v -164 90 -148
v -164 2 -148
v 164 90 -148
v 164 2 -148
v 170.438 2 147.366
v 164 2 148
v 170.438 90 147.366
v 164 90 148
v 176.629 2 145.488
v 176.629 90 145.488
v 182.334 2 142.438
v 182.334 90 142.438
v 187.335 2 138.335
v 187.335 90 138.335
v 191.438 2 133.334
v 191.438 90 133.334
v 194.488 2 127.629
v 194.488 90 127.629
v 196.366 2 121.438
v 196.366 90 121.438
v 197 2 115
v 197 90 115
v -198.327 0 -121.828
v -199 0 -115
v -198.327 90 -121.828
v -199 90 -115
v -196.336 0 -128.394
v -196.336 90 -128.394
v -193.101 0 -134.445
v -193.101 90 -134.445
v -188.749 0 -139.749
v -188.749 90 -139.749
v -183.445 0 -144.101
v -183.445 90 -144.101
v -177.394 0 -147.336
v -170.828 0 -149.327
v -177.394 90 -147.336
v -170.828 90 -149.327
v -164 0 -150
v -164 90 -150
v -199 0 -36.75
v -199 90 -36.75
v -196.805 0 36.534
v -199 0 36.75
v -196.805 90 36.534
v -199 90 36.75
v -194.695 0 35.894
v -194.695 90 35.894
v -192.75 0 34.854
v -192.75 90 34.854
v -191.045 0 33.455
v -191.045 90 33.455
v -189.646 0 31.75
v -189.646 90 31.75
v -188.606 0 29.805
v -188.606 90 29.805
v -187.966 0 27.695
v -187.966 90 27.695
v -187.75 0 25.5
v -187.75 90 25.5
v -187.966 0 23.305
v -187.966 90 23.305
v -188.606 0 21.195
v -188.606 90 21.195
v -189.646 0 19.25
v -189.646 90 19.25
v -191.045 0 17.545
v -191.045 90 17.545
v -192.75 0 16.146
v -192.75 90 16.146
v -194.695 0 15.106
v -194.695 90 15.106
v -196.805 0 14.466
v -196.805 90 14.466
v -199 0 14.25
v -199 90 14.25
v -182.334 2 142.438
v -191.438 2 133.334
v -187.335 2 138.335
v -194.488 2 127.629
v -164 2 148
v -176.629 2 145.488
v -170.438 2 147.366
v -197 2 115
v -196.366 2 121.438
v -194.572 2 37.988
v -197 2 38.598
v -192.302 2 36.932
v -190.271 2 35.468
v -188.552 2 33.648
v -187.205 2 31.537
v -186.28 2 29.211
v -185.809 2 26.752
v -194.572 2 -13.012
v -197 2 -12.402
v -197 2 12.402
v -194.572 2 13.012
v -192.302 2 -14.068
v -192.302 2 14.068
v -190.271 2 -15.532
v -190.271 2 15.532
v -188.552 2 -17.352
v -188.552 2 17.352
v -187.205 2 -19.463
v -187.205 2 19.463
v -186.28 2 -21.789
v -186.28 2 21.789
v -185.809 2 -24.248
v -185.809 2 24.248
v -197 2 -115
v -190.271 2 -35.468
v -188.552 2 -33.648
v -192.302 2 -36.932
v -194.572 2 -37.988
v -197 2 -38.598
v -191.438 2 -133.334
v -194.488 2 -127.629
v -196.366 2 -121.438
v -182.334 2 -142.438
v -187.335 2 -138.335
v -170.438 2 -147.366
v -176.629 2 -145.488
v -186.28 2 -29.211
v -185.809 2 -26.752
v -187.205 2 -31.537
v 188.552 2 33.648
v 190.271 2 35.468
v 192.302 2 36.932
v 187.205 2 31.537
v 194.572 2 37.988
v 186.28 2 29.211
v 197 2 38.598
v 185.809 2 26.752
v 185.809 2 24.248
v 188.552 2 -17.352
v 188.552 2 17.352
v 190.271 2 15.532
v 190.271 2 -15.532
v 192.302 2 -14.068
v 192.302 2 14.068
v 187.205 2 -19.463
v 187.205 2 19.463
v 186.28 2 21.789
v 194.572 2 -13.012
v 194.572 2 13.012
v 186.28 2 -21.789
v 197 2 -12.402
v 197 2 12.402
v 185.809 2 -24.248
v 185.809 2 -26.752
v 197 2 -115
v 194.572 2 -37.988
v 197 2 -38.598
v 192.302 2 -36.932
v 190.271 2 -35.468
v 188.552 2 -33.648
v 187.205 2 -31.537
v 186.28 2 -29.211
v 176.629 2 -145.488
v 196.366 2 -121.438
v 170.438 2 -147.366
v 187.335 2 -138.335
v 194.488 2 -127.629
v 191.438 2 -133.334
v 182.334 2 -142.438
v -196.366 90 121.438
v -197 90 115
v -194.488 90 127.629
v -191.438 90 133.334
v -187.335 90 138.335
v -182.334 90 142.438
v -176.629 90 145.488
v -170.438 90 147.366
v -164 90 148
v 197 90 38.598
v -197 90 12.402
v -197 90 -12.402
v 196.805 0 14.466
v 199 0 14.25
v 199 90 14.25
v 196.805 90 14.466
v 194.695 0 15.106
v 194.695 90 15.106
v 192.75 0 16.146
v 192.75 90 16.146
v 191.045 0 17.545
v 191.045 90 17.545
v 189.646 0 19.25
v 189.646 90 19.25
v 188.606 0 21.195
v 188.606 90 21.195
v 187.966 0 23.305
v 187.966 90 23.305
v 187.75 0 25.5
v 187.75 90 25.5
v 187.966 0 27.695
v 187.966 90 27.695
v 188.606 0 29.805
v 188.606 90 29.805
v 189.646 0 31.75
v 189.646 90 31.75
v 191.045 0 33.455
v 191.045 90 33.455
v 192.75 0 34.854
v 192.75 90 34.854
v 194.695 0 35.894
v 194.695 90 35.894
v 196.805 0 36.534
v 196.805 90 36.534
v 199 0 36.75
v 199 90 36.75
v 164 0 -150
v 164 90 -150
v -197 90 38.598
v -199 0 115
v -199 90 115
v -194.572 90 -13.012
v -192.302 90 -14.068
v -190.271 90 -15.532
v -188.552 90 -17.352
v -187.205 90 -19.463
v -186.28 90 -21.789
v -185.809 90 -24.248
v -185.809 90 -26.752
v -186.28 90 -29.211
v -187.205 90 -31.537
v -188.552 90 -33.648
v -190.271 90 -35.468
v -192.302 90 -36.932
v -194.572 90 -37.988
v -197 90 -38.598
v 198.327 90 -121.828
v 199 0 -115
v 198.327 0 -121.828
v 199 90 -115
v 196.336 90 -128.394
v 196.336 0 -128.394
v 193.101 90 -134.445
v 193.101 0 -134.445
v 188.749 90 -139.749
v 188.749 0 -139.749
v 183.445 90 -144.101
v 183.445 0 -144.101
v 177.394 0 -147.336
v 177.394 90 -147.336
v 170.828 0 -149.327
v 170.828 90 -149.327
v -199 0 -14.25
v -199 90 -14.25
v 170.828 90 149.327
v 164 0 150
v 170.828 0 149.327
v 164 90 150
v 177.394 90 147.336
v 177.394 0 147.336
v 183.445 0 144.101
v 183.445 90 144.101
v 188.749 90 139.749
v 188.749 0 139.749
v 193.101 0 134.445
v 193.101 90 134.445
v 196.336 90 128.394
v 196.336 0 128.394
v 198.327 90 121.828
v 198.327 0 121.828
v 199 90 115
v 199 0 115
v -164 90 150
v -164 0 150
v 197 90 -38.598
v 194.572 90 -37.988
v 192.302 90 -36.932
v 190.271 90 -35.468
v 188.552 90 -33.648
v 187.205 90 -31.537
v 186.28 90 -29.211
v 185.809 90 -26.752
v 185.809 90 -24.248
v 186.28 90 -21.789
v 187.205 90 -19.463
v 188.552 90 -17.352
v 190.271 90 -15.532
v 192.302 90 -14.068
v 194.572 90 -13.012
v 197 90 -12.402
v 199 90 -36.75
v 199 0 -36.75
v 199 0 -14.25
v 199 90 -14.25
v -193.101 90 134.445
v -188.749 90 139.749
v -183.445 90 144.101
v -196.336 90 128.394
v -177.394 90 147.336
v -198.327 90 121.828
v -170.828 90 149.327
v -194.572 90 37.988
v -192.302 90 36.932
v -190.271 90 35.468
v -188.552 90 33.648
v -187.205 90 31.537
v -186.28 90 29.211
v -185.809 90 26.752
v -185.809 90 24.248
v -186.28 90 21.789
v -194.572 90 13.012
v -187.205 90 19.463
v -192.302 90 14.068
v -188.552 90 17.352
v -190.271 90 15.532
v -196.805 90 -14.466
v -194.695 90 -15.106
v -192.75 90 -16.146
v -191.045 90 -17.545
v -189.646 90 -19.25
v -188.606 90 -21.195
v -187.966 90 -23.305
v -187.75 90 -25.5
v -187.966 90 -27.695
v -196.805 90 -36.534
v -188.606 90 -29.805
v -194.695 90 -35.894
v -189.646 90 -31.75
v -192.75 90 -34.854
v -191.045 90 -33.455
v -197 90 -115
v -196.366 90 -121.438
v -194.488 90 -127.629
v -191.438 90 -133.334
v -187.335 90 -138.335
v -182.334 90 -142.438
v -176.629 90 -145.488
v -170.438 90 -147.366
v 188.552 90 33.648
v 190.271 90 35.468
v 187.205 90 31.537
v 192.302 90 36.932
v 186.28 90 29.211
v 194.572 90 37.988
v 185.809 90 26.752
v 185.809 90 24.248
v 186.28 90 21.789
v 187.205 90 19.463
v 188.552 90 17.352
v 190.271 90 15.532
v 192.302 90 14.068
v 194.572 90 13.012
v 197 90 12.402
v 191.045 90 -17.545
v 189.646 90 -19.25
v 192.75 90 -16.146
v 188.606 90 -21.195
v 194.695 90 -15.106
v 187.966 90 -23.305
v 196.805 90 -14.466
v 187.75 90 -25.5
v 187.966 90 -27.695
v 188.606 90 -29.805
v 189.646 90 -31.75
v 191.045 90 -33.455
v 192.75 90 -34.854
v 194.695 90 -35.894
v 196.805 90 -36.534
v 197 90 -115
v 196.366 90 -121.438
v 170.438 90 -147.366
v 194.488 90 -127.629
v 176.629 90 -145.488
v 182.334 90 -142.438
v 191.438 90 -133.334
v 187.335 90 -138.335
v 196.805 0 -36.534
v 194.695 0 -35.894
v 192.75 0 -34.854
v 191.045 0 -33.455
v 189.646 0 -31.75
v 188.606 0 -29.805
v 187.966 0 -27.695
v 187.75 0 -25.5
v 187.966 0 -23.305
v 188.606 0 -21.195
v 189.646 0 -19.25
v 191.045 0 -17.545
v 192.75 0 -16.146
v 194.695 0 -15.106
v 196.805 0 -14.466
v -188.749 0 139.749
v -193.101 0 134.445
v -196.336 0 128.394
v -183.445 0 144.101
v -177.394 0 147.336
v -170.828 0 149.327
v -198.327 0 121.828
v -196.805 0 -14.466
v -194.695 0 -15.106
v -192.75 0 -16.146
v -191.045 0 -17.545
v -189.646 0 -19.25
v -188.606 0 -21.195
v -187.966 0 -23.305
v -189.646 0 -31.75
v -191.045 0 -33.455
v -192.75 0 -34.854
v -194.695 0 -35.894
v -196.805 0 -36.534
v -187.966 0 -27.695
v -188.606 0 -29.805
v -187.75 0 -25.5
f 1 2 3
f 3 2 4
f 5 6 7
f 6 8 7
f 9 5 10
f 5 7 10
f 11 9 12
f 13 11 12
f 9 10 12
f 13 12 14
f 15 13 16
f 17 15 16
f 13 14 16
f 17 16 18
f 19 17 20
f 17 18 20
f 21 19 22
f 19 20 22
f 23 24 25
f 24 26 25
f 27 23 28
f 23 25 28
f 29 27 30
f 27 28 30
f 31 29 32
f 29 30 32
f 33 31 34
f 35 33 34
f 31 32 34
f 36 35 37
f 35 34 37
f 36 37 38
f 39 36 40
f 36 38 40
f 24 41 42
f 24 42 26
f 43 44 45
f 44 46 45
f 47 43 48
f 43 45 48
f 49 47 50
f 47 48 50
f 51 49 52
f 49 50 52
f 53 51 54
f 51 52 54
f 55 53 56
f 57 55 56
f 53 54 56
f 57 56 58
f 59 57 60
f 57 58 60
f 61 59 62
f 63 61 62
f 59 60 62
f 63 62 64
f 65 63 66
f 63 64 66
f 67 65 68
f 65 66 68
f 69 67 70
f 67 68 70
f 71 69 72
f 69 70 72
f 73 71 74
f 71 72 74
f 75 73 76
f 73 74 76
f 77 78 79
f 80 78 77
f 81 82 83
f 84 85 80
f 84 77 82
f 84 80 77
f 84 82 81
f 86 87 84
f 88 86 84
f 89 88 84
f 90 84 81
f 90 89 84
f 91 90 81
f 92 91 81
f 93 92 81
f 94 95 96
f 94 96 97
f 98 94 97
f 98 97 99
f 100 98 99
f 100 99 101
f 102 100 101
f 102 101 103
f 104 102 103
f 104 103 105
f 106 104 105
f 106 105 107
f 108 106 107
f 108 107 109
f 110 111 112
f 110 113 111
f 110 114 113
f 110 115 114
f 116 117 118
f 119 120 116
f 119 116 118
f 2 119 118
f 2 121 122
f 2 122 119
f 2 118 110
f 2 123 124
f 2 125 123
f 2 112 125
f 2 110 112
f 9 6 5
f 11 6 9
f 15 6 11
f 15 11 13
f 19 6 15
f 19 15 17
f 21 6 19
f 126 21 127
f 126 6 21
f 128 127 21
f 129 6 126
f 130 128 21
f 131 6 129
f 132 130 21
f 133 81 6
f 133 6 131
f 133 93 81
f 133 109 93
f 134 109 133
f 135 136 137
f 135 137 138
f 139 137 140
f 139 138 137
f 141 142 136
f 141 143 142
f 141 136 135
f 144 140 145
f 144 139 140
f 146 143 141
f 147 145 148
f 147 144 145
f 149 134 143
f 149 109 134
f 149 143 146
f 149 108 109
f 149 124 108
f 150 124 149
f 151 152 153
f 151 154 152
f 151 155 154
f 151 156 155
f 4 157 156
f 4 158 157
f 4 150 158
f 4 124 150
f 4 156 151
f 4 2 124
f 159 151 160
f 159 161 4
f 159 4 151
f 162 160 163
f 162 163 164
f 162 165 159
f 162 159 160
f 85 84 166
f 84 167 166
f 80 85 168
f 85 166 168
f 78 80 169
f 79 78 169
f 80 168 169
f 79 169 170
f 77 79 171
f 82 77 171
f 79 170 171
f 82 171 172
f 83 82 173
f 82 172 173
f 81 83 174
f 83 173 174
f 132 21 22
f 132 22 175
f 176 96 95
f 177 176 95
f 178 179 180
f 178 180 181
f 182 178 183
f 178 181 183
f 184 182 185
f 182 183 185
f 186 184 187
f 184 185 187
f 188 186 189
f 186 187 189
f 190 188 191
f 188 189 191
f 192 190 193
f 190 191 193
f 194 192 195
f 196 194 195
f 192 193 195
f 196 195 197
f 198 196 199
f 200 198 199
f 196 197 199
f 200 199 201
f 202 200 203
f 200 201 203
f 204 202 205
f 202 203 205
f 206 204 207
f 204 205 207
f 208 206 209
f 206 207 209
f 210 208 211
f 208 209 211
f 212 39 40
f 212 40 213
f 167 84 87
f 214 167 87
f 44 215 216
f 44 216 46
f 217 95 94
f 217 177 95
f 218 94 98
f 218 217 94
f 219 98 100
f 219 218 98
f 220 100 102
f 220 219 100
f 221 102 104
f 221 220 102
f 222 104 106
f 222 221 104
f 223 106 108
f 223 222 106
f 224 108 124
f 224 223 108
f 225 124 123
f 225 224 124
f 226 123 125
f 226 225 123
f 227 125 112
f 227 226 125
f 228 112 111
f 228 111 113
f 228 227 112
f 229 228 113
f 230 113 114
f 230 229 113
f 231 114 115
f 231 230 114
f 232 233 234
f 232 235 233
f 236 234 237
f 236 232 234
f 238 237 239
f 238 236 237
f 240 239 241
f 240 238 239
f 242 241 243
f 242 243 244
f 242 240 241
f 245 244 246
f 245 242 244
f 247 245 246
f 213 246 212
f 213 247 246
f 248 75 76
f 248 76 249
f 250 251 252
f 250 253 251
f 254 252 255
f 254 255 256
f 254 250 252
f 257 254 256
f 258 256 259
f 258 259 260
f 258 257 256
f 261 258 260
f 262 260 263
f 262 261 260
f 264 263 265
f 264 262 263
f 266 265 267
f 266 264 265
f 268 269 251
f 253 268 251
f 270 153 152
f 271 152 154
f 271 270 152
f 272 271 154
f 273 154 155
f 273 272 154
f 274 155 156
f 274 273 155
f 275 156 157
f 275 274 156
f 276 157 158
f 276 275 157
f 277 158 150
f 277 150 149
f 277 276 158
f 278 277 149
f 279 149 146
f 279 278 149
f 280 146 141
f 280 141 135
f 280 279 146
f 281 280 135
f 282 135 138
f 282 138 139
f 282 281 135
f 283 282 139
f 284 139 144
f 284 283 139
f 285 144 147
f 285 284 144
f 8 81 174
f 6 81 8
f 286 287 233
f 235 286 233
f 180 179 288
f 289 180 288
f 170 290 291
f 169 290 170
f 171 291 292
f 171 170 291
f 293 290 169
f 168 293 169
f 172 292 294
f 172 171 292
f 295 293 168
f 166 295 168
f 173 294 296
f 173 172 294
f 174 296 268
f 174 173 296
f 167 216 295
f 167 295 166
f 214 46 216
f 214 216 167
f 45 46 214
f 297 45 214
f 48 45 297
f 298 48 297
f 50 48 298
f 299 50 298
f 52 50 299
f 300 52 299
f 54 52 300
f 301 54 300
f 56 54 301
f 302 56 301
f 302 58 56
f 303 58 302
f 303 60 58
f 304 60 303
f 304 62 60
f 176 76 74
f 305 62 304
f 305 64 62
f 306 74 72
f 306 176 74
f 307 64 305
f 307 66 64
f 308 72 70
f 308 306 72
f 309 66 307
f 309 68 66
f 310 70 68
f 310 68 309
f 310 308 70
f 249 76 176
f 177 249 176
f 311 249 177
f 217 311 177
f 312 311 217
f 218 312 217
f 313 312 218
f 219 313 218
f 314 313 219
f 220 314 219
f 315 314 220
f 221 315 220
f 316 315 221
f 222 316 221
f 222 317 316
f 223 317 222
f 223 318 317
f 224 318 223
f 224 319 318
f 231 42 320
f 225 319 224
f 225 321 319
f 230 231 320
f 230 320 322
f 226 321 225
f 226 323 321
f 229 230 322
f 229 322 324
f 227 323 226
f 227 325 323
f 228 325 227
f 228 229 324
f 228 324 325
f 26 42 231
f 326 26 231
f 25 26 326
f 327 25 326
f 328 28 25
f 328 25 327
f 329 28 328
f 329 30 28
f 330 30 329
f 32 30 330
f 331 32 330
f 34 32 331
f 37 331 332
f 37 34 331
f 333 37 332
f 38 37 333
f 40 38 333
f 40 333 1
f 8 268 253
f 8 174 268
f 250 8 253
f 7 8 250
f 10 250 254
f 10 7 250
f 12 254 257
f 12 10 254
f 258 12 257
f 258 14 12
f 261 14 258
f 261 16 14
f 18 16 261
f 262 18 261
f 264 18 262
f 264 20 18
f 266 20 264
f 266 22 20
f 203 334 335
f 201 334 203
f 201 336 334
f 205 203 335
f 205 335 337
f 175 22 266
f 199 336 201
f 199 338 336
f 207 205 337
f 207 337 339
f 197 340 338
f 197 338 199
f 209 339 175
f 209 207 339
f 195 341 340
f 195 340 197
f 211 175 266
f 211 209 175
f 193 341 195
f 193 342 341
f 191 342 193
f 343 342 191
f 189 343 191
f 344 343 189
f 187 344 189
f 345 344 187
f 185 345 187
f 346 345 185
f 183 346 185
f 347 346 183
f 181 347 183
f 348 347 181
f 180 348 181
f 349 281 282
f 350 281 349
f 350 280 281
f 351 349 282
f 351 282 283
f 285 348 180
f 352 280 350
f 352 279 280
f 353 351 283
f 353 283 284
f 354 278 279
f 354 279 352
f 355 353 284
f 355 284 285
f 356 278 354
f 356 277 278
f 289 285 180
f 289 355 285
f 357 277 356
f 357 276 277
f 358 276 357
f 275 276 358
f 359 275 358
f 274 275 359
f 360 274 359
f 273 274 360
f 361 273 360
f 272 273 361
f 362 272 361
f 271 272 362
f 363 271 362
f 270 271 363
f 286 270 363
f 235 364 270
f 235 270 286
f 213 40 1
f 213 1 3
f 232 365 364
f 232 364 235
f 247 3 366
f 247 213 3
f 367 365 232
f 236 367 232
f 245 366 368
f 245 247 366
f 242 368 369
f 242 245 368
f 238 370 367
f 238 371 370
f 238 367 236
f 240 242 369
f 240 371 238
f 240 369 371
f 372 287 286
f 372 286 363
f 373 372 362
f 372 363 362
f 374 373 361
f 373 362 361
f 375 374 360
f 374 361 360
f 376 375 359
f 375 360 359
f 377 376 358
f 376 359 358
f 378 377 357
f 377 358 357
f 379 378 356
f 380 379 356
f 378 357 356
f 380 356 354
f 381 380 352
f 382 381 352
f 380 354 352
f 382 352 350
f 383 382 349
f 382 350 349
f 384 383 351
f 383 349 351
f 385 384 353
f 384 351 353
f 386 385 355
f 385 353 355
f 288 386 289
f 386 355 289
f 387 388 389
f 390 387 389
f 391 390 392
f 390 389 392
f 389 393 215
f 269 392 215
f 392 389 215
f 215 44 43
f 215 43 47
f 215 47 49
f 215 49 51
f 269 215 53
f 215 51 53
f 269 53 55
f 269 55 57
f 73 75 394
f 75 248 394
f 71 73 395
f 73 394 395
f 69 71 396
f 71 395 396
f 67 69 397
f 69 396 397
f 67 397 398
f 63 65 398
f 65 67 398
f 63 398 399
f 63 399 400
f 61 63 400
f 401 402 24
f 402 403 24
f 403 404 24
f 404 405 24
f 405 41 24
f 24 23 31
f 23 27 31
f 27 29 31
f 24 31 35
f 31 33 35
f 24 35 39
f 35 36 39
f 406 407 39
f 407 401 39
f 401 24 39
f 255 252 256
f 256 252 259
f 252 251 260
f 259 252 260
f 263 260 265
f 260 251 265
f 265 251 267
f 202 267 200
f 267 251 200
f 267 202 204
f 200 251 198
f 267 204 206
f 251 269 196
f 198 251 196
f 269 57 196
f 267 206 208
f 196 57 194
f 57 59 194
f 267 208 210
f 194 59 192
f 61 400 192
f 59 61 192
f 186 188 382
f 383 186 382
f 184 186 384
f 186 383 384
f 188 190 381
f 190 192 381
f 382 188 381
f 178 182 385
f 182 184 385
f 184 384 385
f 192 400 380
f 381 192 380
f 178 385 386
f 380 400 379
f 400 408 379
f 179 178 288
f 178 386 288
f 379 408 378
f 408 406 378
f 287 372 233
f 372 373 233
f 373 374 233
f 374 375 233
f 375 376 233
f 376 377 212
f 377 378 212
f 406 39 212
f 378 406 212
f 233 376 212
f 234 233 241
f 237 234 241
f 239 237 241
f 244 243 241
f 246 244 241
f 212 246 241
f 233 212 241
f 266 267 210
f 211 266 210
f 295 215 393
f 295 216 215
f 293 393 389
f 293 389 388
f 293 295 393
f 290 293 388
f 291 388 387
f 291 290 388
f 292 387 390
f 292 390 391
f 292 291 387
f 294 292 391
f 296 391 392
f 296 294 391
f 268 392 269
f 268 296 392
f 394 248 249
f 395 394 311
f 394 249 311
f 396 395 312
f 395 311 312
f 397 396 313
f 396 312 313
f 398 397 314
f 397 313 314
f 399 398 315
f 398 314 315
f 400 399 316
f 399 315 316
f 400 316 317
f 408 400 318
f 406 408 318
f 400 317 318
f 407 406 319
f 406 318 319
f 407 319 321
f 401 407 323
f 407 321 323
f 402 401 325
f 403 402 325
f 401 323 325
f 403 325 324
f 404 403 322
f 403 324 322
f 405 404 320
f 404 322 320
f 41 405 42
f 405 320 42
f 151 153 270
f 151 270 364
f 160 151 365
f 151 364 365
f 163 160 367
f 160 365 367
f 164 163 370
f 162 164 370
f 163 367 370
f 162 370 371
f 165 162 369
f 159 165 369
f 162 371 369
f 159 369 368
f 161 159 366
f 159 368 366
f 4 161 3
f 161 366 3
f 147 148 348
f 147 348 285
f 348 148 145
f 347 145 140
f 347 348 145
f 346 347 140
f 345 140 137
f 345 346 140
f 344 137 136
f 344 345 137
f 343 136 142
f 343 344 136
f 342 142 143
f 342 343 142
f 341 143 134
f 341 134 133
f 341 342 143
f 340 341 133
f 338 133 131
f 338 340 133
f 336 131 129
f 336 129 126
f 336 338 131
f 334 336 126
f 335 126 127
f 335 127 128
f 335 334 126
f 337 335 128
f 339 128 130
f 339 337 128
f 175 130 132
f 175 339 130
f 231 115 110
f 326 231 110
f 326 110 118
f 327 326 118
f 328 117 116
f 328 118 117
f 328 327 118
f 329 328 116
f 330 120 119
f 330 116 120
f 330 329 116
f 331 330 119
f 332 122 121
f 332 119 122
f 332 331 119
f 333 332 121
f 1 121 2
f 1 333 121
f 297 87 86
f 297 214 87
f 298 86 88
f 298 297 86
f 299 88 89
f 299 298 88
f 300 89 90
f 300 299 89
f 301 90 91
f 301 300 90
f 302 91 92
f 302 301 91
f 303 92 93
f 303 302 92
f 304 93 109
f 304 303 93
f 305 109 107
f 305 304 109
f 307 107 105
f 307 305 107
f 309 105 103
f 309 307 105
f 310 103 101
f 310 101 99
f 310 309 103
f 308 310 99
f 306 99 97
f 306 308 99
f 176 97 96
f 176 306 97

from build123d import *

# Parameters (mm, degrees)
SKETCH_1_W          = 398
SKETCH_1_H          = 300
EXTRUDE_1_DEPTH     = 90
FILLET_1_R          = 35
SKETCH_2_R          = 11.25
CUT_EXTRUDE_1_DEPTH = 90
SHELL_1_T           = -2


with BuildPart() as part:
    # 草图1 → 凸台-拉伸1 (new body)
    with BuildSketch(Plane(origin=(0, 0, 0), x_dir=(1, 0, 0), z_dir=(0, 1, 0))):
        Rectangle(SKETCH_1_W, SKETCH_1_H)
    extrude(amount=EXTRUDE_1_DEPTH)

    # 圆角1
    fillet_1_edges = [part.edges().sort_by_distance(p)[0] for p in [
        (199, 45, 150),
        (-199, 45, 150),
        (-199, 45, -150),
        (199, 45, -150),
    ]]
    fillet(fillet_1_edges, radius=FILLET_1_R)

    # 草图2 → 切除-拉伸1 (cut)
    with BuildSketch(Plane(origin=(0, 90, 0), x_dir=(1, 0, 0), z_dir=(0, 1, 0))):
        with Locations((-199, 25.5)):
            Circle(SKETCH_2_R)
        with Locations((-199, -25.5)):
            Circle(SKETCH_2_R)
        with Locations((199, -25.5)):
            Circle(SKETCH_2_R)
        with Locations((199, 25.5)):
            Circle(SKETCH_2_R)
    extrude(amount=-CUT_EXTRUDE_1_DEPTH, mode=Mode.SUBTRACT)

    # 抽壳1
    shell_1_openings = [part.faces().sort_by_distance(p)[0] for p in [
        (0, 90, 0),
    ]]
    offset(amount=SHELL_1_T, openings=shell_1_openings, kind=Kind.INTERSECTION)


solid = part.part
